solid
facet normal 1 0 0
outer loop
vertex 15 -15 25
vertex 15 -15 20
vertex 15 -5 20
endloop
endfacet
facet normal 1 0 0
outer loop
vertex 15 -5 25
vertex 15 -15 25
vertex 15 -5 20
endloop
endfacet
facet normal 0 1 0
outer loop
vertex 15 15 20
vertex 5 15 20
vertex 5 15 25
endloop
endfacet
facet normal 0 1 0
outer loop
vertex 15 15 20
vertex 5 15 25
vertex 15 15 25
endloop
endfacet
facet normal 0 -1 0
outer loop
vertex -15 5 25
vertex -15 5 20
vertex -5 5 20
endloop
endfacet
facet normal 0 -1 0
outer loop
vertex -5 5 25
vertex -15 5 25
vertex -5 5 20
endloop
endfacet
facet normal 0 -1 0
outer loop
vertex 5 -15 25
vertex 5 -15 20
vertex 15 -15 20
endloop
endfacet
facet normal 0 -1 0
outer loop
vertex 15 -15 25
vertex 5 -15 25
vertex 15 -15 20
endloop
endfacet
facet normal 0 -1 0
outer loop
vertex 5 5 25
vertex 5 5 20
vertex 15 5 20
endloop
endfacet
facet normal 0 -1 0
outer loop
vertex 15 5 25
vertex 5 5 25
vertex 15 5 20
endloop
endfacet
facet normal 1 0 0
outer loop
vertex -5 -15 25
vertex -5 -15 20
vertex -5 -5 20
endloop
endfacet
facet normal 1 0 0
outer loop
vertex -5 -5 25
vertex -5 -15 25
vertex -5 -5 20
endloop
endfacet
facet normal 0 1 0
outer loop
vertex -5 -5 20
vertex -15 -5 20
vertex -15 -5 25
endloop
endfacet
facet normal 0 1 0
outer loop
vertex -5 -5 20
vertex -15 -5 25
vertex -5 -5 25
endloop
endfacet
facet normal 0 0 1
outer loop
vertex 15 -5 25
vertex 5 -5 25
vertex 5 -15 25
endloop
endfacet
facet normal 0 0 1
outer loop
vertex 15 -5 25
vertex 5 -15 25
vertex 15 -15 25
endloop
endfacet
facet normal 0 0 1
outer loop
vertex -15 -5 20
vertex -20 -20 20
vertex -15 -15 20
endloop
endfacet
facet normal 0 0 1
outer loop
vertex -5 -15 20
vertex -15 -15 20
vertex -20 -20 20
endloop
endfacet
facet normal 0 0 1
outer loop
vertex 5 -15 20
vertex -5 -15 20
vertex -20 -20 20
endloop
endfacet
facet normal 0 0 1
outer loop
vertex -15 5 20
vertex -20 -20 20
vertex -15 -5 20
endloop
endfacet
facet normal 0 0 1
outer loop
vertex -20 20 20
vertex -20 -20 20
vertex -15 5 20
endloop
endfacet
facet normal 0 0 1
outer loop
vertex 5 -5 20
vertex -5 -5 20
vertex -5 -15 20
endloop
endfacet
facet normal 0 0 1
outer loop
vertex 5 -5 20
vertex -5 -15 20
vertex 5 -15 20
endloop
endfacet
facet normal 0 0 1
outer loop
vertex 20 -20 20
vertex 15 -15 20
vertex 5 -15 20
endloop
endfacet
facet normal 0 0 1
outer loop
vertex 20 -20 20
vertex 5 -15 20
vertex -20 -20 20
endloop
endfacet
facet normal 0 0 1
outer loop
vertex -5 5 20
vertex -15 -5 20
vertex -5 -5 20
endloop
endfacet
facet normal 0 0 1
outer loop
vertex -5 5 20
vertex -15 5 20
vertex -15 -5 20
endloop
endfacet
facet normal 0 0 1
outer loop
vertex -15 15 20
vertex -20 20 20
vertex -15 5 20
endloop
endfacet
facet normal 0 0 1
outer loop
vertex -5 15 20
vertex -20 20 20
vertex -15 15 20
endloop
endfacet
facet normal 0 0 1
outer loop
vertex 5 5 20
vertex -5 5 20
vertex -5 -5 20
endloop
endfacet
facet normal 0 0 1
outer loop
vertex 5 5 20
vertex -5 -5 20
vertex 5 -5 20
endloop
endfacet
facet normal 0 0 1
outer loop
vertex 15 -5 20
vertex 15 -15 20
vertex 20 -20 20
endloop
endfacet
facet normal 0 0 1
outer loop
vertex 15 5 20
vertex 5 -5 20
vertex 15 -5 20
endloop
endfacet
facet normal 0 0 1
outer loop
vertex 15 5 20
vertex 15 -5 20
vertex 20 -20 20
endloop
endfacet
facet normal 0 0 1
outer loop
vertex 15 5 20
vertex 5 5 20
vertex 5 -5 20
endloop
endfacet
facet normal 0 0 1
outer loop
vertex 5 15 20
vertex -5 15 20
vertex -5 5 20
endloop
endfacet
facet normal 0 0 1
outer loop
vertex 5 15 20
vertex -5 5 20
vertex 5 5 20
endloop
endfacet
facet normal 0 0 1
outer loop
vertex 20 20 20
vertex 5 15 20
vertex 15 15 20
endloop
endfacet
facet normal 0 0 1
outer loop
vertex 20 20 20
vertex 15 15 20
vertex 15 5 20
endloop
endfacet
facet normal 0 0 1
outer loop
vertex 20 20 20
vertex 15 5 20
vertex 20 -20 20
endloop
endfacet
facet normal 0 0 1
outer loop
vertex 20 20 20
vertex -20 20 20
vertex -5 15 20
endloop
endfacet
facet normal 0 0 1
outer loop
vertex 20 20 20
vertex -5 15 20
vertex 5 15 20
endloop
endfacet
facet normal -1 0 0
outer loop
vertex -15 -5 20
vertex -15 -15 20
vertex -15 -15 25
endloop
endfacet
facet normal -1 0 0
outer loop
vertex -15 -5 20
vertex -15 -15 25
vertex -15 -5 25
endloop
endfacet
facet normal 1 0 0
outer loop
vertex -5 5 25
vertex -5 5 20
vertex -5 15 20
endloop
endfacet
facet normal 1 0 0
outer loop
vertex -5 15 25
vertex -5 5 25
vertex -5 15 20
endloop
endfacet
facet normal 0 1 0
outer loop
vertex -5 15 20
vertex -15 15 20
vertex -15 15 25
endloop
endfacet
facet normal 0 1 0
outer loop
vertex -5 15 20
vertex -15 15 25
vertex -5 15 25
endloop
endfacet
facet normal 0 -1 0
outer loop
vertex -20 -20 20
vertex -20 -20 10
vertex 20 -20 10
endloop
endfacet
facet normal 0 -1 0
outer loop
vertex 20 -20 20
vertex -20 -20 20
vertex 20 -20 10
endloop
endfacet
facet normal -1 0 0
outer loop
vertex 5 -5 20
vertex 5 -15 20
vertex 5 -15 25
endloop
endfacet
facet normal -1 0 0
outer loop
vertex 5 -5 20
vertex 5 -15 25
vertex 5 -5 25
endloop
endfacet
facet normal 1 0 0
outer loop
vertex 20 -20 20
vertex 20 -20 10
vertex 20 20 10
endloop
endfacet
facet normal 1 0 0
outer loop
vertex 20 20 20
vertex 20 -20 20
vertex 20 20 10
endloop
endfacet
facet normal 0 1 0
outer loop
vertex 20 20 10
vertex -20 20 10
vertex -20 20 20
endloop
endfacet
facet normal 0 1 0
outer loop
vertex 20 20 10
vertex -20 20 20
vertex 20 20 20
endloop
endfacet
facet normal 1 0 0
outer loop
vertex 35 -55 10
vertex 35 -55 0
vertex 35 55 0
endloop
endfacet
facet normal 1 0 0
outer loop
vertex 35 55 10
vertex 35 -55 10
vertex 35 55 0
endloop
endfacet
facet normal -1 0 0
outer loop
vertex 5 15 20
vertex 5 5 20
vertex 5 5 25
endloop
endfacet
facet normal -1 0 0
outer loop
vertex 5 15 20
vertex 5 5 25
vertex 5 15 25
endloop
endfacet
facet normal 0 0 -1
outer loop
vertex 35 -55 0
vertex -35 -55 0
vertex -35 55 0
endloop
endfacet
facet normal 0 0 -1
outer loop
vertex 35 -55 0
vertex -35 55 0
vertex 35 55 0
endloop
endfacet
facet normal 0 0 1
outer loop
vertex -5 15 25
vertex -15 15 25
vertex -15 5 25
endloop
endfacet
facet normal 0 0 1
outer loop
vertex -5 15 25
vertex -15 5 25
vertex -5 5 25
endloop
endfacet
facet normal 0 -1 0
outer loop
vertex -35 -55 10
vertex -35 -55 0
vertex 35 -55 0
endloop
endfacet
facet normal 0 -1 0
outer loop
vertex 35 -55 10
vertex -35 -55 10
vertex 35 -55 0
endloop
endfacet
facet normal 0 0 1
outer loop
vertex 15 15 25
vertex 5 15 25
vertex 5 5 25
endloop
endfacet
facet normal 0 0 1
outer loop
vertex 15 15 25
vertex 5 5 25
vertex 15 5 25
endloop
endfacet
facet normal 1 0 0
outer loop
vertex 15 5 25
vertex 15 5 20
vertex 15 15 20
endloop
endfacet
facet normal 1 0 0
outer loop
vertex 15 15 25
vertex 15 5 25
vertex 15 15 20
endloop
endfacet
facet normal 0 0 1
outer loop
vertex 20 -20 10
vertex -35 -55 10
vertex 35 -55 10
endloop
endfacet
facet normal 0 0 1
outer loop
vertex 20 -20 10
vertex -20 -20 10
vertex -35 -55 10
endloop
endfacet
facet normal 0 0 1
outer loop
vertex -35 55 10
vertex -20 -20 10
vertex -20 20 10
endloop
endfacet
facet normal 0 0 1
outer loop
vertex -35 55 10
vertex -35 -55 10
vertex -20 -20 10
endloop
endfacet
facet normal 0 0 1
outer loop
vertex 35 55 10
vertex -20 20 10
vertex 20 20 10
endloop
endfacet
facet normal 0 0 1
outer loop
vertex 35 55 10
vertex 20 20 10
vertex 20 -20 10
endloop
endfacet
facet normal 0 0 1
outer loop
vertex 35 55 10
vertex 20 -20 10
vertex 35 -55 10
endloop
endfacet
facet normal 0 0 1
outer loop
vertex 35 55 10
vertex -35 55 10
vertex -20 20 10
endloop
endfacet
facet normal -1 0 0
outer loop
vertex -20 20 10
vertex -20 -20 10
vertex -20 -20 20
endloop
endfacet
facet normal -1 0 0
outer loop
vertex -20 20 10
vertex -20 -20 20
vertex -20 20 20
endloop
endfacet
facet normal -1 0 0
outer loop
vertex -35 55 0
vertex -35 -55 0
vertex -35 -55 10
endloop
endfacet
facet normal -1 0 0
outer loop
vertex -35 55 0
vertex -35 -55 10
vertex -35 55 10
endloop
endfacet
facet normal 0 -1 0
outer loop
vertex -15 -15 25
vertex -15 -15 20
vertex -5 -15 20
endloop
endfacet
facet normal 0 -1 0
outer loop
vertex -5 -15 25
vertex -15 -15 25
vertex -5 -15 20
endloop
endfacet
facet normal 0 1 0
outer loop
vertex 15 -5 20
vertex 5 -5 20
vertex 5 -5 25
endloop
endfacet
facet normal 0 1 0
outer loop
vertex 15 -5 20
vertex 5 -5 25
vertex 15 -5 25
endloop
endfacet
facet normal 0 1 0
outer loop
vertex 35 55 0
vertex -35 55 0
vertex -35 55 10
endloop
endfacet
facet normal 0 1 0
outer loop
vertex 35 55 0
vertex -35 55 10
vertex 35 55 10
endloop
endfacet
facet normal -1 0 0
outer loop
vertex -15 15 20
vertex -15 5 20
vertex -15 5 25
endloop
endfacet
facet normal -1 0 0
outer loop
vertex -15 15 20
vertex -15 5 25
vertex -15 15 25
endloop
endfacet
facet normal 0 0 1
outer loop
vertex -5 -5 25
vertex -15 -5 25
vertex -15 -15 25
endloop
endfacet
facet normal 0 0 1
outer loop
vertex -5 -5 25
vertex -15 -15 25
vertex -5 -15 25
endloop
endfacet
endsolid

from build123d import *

# Parameters (mm, degrees)
F0_W     = 70
F0_H     = 110
F1_DEPTH = 10
F2_W     = 40
F2_H     = 40
F3_DEPTH = 10
F4_W     = 10
F4_H     = 10
F5_DEPTH = 5


with BuildPart() as f1:
    # F0 (on Top) → F1 (new body)
    with BuildSketch(Plane.XY):
        Rectangle(F0_W, F0_H)
    extrude(amount=F1_DEPTH)

    # F2 (on face) → F3 (join)
    with BuildSketch(Plane.XY.offset(10)):
        Rectangle(F2_W, F2_H)
    extrude(amount=F3_DEPTH)

    # F4 (on face) → F5 (join)
    with BuildSketch(Plane.XY.offset(20)):
        with Locations((-10, 10)):
            Rectangle(F4_W, F4_H)
        with Locations((10, 10)):
            Rectangle(F4_W, F4_H)
        with Locations((10, -10)):
            Rectangle(F4_W, F4_H)
        with Locations((-10, -10)):
            Rectangle(F4_W, F4_H)
    extrude(amount=F5_DEPTH)


solid = f1.part
